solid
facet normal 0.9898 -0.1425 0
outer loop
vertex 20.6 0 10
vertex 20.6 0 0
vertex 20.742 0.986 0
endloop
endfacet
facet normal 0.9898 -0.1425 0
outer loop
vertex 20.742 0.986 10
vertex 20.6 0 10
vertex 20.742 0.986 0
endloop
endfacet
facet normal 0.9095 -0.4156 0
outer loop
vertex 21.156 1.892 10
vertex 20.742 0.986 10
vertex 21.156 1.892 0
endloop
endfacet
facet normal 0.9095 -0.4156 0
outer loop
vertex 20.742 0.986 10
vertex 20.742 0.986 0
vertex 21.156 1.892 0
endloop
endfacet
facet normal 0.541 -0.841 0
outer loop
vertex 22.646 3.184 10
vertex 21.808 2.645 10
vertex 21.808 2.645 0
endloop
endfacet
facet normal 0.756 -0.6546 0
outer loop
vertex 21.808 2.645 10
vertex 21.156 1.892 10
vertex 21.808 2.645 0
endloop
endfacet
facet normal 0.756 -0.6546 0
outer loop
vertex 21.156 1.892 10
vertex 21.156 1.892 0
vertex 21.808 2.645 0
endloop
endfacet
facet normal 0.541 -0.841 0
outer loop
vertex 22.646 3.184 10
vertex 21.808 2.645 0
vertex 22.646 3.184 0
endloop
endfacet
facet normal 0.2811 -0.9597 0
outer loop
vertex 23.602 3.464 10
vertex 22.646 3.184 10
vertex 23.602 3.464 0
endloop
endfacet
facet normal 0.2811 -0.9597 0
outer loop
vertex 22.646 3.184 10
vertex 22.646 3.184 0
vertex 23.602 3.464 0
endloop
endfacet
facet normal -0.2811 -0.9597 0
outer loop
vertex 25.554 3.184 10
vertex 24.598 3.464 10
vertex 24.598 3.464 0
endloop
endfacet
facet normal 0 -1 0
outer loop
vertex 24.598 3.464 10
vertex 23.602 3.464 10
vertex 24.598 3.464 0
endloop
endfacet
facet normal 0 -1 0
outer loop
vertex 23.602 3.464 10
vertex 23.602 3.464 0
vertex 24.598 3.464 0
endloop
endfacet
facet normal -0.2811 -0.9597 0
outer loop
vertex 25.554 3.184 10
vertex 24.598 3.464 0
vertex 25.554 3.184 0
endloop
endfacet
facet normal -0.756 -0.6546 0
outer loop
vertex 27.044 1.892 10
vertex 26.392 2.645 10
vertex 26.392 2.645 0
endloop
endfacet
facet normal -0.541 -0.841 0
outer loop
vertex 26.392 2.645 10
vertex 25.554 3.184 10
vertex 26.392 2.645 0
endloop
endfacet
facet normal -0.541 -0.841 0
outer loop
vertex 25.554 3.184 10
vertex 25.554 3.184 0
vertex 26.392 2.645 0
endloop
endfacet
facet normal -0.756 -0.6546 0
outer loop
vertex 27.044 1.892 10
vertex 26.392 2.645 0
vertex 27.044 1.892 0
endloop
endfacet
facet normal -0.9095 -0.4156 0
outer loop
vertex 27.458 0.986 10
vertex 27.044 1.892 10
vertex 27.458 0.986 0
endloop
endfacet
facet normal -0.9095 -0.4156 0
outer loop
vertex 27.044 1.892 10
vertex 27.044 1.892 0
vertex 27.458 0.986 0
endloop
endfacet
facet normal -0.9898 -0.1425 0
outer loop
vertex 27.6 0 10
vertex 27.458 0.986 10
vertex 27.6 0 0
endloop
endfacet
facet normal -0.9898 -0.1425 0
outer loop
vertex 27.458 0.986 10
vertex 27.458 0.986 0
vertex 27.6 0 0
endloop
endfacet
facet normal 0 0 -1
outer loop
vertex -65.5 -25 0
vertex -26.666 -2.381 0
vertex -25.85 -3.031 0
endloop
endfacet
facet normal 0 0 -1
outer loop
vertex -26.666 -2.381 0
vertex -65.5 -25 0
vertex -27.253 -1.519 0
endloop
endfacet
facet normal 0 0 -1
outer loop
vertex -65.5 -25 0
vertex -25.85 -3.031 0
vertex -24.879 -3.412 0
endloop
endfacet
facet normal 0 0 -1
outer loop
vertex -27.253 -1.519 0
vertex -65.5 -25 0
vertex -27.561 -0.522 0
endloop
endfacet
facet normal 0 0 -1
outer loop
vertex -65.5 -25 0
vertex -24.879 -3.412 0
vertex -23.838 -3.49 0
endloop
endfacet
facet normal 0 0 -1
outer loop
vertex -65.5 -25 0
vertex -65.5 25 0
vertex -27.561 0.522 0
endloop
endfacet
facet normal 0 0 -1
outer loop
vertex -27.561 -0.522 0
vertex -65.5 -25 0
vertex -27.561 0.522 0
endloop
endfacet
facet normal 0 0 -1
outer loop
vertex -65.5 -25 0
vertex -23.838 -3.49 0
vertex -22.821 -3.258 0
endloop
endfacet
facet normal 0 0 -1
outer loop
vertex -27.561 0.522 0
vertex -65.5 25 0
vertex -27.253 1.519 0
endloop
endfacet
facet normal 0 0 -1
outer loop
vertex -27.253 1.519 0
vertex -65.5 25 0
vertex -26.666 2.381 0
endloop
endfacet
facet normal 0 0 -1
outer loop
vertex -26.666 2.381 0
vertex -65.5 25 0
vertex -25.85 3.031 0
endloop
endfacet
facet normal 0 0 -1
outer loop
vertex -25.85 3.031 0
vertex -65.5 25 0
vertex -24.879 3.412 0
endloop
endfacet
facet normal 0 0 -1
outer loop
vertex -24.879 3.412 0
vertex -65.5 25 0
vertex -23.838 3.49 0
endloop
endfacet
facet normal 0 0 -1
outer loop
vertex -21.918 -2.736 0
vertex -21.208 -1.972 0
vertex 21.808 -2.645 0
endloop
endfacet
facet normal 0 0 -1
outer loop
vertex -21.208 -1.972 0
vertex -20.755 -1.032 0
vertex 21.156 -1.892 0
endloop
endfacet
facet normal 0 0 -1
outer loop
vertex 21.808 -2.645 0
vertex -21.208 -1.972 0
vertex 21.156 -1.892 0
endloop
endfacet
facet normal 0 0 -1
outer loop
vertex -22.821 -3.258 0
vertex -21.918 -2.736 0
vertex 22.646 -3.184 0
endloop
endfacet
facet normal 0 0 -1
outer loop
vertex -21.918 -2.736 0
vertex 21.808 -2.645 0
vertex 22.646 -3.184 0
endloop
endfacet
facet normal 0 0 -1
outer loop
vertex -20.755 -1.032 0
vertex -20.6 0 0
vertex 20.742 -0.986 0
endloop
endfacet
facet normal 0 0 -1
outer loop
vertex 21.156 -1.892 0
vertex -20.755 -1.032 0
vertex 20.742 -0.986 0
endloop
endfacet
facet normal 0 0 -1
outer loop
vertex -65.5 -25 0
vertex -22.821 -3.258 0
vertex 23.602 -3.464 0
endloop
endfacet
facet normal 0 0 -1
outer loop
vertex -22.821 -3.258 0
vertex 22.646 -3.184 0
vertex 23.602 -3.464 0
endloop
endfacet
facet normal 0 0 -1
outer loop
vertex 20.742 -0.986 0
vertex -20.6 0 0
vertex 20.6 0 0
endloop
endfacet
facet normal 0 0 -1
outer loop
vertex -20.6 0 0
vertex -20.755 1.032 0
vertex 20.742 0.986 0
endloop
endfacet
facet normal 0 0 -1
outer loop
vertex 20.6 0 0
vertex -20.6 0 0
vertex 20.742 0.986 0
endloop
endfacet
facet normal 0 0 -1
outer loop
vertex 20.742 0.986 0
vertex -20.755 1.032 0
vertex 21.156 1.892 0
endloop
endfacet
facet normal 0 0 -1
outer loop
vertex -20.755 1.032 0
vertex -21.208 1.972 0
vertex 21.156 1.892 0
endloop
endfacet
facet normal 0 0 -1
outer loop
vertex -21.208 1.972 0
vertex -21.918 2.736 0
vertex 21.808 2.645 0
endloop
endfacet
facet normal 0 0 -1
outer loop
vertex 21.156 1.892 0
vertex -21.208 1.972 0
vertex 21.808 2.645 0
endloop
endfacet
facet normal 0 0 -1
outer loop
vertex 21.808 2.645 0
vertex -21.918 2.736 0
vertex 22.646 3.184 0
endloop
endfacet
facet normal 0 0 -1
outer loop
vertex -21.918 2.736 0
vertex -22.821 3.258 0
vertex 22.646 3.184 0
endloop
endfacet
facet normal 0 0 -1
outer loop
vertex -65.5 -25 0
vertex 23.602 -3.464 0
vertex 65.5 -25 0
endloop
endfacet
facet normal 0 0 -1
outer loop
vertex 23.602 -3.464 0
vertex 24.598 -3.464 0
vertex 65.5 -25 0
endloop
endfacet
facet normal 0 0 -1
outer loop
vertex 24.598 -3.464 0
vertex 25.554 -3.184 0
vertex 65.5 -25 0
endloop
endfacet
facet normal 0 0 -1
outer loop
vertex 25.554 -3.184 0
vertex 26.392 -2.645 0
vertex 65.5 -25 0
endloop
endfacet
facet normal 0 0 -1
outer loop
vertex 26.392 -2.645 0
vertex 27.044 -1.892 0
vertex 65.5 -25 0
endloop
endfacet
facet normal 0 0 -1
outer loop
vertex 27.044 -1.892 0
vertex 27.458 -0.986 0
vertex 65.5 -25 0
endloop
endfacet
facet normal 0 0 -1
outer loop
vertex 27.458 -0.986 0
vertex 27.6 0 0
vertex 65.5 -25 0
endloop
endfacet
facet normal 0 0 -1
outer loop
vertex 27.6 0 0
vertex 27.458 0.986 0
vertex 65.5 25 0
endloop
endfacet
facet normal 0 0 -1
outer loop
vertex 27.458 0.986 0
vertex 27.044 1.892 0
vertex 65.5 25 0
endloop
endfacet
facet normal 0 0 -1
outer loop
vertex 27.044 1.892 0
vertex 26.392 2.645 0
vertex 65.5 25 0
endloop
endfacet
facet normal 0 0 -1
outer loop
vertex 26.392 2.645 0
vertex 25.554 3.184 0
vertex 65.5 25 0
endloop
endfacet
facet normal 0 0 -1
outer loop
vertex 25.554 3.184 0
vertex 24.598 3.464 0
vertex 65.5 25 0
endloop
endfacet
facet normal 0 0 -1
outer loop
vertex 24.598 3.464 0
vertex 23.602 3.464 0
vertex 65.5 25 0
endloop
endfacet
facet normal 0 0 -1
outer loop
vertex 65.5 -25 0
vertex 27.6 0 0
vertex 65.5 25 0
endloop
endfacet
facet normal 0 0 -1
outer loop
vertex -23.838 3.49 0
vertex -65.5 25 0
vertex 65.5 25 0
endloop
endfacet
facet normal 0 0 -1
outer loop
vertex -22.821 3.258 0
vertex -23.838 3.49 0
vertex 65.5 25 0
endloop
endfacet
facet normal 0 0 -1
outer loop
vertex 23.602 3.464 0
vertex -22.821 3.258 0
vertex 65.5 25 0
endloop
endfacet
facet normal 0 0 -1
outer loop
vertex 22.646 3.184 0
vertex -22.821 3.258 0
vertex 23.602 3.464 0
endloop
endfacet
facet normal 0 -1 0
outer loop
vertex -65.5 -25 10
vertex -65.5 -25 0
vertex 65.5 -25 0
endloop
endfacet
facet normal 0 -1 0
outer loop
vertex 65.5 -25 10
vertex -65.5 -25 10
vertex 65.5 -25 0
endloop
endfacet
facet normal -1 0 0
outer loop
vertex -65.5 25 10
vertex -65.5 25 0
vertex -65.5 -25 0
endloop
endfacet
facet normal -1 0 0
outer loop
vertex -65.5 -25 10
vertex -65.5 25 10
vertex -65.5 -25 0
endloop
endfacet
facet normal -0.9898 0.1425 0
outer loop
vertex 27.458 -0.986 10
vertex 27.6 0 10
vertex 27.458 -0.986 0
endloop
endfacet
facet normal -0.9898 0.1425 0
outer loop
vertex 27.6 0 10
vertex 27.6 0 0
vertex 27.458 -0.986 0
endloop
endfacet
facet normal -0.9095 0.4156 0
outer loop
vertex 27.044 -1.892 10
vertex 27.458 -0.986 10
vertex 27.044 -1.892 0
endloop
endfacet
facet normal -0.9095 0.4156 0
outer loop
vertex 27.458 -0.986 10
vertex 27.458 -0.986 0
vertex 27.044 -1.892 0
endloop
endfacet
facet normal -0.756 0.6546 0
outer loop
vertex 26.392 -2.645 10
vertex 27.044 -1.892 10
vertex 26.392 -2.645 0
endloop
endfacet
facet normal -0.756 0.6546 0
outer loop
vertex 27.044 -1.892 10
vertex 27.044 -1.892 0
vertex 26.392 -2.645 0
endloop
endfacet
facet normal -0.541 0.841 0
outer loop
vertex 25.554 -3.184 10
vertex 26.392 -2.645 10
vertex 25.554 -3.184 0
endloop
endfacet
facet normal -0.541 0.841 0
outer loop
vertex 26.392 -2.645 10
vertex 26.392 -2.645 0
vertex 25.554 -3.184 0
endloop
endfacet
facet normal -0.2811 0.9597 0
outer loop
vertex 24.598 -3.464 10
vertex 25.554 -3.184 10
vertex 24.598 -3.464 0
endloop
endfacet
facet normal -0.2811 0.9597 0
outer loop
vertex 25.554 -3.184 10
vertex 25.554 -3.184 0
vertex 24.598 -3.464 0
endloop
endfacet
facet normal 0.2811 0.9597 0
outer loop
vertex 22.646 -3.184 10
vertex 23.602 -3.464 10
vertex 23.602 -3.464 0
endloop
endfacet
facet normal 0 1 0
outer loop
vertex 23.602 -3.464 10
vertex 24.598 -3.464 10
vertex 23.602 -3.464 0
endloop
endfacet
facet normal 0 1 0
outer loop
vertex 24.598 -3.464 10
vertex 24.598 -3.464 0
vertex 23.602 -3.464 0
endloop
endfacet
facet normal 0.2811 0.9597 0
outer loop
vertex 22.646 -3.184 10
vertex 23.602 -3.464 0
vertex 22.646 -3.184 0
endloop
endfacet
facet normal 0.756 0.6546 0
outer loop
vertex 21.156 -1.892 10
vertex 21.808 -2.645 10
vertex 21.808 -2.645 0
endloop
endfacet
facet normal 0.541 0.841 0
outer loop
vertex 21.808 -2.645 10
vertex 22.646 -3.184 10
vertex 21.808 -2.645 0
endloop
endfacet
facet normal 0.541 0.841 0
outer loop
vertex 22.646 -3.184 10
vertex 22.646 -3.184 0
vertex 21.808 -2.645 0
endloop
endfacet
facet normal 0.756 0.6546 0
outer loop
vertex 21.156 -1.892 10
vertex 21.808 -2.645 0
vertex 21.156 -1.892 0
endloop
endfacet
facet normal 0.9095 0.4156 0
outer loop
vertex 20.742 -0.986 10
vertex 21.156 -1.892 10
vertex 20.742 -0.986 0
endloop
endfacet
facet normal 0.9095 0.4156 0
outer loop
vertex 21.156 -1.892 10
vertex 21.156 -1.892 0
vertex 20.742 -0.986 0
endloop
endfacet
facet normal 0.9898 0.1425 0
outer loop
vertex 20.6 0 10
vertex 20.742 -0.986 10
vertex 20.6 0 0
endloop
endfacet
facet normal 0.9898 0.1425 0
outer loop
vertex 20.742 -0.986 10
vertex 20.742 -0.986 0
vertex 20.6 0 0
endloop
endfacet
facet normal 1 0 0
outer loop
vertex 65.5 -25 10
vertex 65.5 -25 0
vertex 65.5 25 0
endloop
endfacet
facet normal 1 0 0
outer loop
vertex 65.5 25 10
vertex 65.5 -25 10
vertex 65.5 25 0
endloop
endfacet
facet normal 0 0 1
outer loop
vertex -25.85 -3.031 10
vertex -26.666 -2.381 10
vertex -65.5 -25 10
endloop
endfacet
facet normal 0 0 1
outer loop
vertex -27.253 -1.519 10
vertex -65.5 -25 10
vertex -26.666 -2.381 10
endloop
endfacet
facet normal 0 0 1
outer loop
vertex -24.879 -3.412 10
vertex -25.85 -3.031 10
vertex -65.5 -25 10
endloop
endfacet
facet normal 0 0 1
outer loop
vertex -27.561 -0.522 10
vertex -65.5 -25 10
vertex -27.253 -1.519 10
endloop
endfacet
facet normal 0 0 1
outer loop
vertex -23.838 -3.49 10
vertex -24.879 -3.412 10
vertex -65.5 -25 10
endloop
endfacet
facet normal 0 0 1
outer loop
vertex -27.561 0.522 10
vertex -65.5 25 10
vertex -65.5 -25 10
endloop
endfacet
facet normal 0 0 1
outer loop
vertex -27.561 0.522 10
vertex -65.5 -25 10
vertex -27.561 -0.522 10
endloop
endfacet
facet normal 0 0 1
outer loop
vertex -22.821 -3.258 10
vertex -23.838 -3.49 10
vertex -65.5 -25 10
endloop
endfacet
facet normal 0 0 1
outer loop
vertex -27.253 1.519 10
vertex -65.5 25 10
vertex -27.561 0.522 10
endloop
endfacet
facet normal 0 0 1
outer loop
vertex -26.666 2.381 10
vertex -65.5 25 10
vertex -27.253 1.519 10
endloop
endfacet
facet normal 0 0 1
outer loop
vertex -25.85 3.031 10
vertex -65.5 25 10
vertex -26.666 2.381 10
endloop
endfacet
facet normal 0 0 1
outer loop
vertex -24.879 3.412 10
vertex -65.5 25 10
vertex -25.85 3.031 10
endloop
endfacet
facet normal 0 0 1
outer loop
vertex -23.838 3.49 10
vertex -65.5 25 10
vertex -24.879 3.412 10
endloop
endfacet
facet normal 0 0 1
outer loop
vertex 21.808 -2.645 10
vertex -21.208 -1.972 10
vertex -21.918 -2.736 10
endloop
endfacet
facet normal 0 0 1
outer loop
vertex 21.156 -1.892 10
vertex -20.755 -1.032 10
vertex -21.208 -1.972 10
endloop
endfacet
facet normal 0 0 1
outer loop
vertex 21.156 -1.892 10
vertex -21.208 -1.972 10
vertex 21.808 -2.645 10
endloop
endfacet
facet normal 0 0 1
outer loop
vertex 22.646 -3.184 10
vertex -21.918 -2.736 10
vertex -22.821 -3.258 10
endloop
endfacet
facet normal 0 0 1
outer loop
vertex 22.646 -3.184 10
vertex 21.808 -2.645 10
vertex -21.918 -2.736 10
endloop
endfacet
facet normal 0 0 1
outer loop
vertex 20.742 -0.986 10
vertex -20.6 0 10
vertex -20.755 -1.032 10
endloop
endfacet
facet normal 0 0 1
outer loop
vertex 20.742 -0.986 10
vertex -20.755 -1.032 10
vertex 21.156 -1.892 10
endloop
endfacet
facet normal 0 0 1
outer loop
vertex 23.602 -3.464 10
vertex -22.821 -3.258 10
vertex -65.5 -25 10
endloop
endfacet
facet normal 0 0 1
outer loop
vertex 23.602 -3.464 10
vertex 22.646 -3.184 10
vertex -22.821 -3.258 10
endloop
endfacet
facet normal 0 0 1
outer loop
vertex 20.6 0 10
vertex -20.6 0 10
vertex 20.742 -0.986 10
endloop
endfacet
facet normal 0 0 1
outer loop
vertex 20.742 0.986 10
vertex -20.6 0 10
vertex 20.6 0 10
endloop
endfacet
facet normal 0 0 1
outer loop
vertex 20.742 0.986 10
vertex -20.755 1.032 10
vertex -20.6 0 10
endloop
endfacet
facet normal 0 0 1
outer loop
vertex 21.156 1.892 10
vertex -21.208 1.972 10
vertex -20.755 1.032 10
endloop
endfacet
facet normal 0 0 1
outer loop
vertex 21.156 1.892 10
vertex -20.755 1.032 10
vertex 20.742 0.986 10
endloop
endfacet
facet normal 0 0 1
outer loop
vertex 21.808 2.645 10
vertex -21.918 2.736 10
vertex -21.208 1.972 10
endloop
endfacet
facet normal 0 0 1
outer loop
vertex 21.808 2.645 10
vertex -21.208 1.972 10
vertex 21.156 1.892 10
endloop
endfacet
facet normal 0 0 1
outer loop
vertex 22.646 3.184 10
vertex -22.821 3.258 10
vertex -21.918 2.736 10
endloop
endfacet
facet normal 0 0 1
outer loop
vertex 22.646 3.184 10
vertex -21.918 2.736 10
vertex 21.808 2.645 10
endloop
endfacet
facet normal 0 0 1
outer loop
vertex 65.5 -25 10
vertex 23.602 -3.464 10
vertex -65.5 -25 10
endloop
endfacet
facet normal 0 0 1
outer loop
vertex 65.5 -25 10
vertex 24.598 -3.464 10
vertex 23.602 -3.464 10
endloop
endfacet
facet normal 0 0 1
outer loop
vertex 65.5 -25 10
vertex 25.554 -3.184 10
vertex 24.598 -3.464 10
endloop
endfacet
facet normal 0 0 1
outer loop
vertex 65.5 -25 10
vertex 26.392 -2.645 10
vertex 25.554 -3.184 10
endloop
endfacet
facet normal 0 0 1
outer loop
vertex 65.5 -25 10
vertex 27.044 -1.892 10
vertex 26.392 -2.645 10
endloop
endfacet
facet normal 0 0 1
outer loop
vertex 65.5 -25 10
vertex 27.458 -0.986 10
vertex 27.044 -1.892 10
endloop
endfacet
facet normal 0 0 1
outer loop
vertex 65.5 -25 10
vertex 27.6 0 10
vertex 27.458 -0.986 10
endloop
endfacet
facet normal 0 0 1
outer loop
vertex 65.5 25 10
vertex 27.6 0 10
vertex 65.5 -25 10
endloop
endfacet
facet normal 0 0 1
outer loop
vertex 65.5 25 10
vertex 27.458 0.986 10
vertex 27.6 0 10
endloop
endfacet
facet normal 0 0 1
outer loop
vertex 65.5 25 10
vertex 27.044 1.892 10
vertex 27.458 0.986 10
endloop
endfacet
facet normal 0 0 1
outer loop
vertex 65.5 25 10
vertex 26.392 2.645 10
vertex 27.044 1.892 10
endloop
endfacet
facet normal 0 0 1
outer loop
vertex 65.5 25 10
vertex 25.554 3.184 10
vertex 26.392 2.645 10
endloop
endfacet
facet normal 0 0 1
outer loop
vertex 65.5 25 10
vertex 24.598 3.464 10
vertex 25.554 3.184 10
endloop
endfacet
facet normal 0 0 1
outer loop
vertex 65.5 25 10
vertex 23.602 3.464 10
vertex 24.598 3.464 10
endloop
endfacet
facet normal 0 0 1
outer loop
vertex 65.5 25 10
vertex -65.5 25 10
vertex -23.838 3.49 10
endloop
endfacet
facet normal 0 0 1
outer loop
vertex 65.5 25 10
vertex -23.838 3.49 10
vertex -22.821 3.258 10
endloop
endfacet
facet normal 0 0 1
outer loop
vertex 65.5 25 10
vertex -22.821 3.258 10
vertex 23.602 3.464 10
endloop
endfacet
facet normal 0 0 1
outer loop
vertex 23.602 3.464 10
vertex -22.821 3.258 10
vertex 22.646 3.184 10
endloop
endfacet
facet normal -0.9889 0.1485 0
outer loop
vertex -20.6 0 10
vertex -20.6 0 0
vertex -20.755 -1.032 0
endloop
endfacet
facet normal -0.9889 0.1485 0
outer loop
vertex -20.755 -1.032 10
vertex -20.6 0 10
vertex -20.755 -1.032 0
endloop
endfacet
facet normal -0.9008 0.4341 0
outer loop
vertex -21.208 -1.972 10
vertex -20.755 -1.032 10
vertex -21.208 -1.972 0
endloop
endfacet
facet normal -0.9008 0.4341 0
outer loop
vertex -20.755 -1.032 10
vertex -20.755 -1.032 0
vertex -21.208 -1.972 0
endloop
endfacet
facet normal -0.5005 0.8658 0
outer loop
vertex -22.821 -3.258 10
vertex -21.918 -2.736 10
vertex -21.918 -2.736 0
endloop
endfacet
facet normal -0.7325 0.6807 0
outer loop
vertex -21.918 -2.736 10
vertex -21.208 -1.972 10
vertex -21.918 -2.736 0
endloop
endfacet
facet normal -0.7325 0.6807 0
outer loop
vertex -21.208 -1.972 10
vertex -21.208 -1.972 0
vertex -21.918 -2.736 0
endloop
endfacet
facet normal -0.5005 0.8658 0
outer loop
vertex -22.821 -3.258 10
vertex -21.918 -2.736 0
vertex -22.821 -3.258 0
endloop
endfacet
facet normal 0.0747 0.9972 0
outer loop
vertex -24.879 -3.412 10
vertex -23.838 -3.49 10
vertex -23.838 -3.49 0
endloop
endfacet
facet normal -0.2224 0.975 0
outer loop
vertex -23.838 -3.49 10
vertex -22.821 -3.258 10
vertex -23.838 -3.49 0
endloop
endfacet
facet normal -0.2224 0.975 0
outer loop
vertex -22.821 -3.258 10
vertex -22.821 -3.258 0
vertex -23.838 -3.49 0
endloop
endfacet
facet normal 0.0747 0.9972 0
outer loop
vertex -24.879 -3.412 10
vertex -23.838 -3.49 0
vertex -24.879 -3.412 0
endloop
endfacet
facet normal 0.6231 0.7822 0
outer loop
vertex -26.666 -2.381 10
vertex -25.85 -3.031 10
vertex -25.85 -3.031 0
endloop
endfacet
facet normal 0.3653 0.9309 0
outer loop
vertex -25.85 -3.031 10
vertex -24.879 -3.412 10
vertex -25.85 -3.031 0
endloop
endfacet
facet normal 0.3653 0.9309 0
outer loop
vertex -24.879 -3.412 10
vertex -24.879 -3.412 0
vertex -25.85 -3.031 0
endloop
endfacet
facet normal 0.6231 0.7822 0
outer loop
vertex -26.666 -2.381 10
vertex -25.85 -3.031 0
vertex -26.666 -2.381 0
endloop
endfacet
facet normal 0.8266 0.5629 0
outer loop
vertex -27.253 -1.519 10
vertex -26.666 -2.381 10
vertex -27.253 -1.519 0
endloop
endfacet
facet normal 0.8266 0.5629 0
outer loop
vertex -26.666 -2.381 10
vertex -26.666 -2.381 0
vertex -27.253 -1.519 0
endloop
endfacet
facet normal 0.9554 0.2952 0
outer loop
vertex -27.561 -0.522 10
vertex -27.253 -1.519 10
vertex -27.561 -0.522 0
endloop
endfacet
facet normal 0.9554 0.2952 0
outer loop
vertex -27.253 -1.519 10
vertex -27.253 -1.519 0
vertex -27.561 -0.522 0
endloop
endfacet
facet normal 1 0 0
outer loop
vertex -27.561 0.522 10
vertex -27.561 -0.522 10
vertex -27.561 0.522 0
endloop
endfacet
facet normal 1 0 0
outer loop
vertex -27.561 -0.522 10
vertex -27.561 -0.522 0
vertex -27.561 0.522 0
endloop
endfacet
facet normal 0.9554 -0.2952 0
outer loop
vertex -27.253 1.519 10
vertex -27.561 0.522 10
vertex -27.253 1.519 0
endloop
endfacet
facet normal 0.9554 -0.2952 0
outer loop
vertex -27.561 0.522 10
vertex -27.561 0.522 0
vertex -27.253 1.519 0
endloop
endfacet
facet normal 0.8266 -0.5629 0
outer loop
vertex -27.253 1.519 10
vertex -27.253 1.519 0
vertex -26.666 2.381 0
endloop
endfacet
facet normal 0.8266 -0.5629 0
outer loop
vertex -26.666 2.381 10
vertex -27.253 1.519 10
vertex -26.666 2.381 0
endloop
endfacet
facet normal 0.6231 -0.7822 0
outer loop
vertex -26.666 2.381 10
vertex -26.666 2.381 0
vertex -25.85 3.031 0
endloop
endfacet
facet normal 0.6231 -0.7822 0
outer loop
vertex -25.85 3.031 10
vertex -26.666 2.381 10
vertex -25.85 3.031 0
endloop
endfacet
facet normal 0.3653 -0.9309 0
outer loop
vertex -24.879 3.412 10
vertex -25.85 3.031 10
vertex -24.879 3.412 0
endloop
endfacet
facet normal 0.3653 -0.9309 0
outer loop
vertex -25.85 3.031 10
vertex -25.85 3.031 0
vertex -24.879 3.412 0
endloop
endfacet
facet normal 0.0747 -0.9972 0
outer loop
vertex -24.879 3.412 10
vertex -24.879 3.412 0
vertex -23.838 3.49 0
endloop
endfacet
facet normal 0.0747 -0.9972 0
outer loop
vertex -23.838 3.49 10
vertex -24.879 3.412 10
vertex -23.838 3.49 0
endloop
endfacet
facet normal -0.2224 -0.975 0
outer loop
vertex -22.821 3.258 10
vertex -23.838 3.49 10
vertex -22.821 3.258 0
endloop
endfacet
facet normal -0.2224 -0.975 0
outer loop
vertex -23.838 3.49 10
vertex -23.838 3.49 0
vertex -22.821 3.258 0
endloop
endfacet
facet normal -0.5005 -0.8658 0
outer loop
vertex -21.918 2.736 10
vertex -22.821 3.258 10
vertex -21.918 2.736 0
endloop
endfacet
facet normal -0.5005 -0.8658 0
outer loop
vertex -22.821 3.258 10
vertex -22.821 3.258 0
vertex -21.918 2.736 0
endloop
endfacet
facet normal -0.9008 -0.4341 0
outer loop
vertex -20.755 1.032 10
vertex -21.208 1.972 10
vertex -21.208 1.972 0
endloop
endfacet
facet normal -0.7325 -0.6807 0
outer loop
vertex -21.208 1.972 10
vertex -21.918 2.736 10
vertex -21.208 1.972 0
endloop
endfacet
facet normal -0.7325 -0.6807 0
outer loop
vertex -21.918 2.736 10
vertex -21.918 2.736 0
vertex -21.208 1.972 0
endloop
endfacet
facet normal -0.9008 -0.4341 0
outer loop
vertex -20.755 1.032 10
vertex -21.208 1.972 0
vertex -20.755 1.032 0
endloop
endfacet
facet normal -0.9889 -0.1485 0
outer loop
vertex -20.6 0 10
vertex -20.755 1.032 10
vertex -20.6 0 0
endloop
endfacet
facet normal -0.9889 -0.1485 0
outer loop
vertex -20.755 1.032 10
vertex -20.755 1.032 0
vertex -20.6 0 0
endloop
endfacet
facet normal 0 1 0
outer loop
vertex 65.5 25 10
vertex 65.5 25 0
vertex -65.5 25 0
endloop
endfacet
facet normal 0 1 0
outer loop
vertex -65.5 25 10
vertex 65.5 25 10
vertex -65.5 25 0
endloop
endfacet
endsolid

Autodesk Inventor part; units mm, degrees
ref_plane "YZ Plane" through (0, 0, 0) normal (1, 0, 0) x (0, 1, 0)
ref_plane "XZ Plane" through (0, 0, 0) normal (0, 1, 0) x (-1, 0, 0)
ref_plane "XY Plane" through (0, 0, 0) normal (0, 0, 1) x (1, 0, 0)
sketch "Sketch1" plane through (0, 0, 0) normal (0, 0, 1) x (1, 0, 0)
  line L0 (65.5, 25) -> (-65.5, 25)
  line L1 (-65.5, 25) -> (-65.5, -25)
  line L2 (-65.5, -25) -> (65.5, -25)
  line L3 (65.5, -25) -> (65.5, 25)
  line L4 (65.5, 25) -> (-65.5, -25) construction
  line L5 (-65.5, 25) -> (65.5, -25) construction
  line L6 (0, 0) -> (-24.1, 0)
  line L7 (0, 0) -> (24.1, 0)
  circle A0 centre (-24.1, 0) radius 3.5
  circle A1 centre (24.1, 0) radius 3.5
  dimension "d0" = 131
  dimension "d1" = 50
  dimension "d2" = 24.1
  dimension "d3" = 24.1
  dimension "d4" = 7
  dimension "d5" = 7
extrude "Extrusion1" add sketch "Sketch1" along normal blind 10
properties part number "prepazka_bez_loziska"
